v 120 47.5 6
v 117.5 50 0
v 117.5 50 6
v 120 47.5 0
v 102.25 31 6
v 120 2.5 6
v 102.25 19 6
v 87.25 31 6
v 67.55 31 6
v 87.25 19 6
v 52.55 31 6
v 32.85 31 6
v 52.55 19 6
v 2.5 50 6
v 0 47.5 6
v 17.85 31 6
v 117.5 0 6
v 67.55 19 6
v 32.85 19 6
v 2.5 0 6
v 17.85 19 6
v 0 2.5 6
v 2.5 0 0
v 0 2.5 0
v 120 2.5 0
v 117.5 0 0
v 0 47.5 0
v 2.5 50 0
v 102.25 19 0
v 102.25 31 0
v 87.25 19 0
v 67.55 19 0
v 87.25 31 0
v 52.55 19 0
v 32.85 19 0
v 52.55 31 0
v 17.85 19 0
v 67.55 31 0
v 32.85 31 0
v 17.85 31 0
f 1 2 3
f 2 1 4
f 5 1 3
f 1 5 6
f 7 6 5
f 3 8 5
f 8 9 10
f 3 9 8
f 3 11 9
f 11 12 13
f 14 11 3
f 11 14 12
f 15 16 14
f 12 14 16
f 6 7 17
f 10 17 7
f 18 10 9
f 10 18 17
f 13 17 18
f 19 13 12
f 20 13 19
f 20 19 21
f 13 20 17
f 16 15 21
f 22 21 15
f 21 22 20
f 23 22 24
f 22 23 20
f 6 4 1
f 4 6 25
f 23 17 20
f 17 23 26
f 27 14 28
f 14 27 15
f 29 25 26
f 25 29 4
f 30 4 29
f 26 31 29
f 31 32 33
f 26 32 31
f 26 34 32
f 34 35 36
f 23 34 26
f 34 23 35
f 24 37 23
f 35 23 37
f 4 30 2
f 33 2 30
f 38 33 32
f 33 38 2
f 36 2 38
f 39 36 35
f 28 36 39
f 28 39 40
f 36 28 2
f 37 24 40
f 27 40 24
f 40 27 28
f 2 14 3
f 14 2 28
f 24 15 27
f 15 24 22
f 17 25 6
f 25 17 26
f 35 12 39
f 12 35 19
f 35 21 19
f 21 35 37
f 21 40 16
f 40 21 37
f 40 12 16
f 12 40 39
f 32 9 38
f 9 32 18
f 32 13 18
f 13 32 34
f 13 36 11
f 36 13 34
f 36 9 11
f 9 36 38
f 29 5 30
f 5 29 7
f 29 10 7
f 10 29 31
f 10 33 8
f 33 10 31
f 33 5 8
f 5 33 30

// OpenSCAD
$fn = 32;

// ----------------------------------------------------------------------
// Windowed plate: 3 voids, 120 x 50 x 6 mm
// ----------------------------------------------------------------------

// --- parameters (mm) ---
plate_l = 120;            // plate length, X
plate_w = 50;             // plate width, Y
plate_t = 6;              // plate thickness, Z
edge_margin = 8;          // wall from the plate edge to any window
windows = 3;              // number of windows in the row
win_l = 15;               // window length
win_w = 12;               // window width
win_pitch = 34.7;         // window pitch along X
depth_1 = 6;              // depth of void 1 (full thickness = through)
depth_2 = 6;              // depth of void 2 (full thickness = through)
depth_3 = 6;              // depth of void 3 (full thickness = through)
corner_c = 2.5;           // corner chamfer of the plate

profile = [[2.5, 0], [117.5, 0], [120, 2.5], [120, 47.5], [117.5, 50], [2.5, 50], [0, 47.5], [0, 2.5]];  // primary outline, 8 points, counter clockwise
void_1 = [[17.85, 19], [32.85, 19], [32.85, 31], [17.85, 31]];  // window 1 of the row, 4 points
void_2 = [[52.55, 19], [67.55, 19], [67.55, 31], [52.55, 31]];  // window 2 of the row, 4 points
void_3 = [[87.25, 19], [102.25, 19], [102.25, 31], [87.25, 31]];  // window 3 of the row, 4 points

// --- the one profile operation ---
difference() {
  linear_extrude(height = plate_t) polygon(points = profile);
  translate([0, 0, -1])
    linear_extrude(height = plate_t + 2) polygon(points = void_1);
  translate([0, 0, -1])
    linear_extrude(height = plate_t + 2) polygon(points = void_2);
  translate([0, 0, -1])
    linear_extrude(height = plate_t + 2) polygon(points = void_3);
}
